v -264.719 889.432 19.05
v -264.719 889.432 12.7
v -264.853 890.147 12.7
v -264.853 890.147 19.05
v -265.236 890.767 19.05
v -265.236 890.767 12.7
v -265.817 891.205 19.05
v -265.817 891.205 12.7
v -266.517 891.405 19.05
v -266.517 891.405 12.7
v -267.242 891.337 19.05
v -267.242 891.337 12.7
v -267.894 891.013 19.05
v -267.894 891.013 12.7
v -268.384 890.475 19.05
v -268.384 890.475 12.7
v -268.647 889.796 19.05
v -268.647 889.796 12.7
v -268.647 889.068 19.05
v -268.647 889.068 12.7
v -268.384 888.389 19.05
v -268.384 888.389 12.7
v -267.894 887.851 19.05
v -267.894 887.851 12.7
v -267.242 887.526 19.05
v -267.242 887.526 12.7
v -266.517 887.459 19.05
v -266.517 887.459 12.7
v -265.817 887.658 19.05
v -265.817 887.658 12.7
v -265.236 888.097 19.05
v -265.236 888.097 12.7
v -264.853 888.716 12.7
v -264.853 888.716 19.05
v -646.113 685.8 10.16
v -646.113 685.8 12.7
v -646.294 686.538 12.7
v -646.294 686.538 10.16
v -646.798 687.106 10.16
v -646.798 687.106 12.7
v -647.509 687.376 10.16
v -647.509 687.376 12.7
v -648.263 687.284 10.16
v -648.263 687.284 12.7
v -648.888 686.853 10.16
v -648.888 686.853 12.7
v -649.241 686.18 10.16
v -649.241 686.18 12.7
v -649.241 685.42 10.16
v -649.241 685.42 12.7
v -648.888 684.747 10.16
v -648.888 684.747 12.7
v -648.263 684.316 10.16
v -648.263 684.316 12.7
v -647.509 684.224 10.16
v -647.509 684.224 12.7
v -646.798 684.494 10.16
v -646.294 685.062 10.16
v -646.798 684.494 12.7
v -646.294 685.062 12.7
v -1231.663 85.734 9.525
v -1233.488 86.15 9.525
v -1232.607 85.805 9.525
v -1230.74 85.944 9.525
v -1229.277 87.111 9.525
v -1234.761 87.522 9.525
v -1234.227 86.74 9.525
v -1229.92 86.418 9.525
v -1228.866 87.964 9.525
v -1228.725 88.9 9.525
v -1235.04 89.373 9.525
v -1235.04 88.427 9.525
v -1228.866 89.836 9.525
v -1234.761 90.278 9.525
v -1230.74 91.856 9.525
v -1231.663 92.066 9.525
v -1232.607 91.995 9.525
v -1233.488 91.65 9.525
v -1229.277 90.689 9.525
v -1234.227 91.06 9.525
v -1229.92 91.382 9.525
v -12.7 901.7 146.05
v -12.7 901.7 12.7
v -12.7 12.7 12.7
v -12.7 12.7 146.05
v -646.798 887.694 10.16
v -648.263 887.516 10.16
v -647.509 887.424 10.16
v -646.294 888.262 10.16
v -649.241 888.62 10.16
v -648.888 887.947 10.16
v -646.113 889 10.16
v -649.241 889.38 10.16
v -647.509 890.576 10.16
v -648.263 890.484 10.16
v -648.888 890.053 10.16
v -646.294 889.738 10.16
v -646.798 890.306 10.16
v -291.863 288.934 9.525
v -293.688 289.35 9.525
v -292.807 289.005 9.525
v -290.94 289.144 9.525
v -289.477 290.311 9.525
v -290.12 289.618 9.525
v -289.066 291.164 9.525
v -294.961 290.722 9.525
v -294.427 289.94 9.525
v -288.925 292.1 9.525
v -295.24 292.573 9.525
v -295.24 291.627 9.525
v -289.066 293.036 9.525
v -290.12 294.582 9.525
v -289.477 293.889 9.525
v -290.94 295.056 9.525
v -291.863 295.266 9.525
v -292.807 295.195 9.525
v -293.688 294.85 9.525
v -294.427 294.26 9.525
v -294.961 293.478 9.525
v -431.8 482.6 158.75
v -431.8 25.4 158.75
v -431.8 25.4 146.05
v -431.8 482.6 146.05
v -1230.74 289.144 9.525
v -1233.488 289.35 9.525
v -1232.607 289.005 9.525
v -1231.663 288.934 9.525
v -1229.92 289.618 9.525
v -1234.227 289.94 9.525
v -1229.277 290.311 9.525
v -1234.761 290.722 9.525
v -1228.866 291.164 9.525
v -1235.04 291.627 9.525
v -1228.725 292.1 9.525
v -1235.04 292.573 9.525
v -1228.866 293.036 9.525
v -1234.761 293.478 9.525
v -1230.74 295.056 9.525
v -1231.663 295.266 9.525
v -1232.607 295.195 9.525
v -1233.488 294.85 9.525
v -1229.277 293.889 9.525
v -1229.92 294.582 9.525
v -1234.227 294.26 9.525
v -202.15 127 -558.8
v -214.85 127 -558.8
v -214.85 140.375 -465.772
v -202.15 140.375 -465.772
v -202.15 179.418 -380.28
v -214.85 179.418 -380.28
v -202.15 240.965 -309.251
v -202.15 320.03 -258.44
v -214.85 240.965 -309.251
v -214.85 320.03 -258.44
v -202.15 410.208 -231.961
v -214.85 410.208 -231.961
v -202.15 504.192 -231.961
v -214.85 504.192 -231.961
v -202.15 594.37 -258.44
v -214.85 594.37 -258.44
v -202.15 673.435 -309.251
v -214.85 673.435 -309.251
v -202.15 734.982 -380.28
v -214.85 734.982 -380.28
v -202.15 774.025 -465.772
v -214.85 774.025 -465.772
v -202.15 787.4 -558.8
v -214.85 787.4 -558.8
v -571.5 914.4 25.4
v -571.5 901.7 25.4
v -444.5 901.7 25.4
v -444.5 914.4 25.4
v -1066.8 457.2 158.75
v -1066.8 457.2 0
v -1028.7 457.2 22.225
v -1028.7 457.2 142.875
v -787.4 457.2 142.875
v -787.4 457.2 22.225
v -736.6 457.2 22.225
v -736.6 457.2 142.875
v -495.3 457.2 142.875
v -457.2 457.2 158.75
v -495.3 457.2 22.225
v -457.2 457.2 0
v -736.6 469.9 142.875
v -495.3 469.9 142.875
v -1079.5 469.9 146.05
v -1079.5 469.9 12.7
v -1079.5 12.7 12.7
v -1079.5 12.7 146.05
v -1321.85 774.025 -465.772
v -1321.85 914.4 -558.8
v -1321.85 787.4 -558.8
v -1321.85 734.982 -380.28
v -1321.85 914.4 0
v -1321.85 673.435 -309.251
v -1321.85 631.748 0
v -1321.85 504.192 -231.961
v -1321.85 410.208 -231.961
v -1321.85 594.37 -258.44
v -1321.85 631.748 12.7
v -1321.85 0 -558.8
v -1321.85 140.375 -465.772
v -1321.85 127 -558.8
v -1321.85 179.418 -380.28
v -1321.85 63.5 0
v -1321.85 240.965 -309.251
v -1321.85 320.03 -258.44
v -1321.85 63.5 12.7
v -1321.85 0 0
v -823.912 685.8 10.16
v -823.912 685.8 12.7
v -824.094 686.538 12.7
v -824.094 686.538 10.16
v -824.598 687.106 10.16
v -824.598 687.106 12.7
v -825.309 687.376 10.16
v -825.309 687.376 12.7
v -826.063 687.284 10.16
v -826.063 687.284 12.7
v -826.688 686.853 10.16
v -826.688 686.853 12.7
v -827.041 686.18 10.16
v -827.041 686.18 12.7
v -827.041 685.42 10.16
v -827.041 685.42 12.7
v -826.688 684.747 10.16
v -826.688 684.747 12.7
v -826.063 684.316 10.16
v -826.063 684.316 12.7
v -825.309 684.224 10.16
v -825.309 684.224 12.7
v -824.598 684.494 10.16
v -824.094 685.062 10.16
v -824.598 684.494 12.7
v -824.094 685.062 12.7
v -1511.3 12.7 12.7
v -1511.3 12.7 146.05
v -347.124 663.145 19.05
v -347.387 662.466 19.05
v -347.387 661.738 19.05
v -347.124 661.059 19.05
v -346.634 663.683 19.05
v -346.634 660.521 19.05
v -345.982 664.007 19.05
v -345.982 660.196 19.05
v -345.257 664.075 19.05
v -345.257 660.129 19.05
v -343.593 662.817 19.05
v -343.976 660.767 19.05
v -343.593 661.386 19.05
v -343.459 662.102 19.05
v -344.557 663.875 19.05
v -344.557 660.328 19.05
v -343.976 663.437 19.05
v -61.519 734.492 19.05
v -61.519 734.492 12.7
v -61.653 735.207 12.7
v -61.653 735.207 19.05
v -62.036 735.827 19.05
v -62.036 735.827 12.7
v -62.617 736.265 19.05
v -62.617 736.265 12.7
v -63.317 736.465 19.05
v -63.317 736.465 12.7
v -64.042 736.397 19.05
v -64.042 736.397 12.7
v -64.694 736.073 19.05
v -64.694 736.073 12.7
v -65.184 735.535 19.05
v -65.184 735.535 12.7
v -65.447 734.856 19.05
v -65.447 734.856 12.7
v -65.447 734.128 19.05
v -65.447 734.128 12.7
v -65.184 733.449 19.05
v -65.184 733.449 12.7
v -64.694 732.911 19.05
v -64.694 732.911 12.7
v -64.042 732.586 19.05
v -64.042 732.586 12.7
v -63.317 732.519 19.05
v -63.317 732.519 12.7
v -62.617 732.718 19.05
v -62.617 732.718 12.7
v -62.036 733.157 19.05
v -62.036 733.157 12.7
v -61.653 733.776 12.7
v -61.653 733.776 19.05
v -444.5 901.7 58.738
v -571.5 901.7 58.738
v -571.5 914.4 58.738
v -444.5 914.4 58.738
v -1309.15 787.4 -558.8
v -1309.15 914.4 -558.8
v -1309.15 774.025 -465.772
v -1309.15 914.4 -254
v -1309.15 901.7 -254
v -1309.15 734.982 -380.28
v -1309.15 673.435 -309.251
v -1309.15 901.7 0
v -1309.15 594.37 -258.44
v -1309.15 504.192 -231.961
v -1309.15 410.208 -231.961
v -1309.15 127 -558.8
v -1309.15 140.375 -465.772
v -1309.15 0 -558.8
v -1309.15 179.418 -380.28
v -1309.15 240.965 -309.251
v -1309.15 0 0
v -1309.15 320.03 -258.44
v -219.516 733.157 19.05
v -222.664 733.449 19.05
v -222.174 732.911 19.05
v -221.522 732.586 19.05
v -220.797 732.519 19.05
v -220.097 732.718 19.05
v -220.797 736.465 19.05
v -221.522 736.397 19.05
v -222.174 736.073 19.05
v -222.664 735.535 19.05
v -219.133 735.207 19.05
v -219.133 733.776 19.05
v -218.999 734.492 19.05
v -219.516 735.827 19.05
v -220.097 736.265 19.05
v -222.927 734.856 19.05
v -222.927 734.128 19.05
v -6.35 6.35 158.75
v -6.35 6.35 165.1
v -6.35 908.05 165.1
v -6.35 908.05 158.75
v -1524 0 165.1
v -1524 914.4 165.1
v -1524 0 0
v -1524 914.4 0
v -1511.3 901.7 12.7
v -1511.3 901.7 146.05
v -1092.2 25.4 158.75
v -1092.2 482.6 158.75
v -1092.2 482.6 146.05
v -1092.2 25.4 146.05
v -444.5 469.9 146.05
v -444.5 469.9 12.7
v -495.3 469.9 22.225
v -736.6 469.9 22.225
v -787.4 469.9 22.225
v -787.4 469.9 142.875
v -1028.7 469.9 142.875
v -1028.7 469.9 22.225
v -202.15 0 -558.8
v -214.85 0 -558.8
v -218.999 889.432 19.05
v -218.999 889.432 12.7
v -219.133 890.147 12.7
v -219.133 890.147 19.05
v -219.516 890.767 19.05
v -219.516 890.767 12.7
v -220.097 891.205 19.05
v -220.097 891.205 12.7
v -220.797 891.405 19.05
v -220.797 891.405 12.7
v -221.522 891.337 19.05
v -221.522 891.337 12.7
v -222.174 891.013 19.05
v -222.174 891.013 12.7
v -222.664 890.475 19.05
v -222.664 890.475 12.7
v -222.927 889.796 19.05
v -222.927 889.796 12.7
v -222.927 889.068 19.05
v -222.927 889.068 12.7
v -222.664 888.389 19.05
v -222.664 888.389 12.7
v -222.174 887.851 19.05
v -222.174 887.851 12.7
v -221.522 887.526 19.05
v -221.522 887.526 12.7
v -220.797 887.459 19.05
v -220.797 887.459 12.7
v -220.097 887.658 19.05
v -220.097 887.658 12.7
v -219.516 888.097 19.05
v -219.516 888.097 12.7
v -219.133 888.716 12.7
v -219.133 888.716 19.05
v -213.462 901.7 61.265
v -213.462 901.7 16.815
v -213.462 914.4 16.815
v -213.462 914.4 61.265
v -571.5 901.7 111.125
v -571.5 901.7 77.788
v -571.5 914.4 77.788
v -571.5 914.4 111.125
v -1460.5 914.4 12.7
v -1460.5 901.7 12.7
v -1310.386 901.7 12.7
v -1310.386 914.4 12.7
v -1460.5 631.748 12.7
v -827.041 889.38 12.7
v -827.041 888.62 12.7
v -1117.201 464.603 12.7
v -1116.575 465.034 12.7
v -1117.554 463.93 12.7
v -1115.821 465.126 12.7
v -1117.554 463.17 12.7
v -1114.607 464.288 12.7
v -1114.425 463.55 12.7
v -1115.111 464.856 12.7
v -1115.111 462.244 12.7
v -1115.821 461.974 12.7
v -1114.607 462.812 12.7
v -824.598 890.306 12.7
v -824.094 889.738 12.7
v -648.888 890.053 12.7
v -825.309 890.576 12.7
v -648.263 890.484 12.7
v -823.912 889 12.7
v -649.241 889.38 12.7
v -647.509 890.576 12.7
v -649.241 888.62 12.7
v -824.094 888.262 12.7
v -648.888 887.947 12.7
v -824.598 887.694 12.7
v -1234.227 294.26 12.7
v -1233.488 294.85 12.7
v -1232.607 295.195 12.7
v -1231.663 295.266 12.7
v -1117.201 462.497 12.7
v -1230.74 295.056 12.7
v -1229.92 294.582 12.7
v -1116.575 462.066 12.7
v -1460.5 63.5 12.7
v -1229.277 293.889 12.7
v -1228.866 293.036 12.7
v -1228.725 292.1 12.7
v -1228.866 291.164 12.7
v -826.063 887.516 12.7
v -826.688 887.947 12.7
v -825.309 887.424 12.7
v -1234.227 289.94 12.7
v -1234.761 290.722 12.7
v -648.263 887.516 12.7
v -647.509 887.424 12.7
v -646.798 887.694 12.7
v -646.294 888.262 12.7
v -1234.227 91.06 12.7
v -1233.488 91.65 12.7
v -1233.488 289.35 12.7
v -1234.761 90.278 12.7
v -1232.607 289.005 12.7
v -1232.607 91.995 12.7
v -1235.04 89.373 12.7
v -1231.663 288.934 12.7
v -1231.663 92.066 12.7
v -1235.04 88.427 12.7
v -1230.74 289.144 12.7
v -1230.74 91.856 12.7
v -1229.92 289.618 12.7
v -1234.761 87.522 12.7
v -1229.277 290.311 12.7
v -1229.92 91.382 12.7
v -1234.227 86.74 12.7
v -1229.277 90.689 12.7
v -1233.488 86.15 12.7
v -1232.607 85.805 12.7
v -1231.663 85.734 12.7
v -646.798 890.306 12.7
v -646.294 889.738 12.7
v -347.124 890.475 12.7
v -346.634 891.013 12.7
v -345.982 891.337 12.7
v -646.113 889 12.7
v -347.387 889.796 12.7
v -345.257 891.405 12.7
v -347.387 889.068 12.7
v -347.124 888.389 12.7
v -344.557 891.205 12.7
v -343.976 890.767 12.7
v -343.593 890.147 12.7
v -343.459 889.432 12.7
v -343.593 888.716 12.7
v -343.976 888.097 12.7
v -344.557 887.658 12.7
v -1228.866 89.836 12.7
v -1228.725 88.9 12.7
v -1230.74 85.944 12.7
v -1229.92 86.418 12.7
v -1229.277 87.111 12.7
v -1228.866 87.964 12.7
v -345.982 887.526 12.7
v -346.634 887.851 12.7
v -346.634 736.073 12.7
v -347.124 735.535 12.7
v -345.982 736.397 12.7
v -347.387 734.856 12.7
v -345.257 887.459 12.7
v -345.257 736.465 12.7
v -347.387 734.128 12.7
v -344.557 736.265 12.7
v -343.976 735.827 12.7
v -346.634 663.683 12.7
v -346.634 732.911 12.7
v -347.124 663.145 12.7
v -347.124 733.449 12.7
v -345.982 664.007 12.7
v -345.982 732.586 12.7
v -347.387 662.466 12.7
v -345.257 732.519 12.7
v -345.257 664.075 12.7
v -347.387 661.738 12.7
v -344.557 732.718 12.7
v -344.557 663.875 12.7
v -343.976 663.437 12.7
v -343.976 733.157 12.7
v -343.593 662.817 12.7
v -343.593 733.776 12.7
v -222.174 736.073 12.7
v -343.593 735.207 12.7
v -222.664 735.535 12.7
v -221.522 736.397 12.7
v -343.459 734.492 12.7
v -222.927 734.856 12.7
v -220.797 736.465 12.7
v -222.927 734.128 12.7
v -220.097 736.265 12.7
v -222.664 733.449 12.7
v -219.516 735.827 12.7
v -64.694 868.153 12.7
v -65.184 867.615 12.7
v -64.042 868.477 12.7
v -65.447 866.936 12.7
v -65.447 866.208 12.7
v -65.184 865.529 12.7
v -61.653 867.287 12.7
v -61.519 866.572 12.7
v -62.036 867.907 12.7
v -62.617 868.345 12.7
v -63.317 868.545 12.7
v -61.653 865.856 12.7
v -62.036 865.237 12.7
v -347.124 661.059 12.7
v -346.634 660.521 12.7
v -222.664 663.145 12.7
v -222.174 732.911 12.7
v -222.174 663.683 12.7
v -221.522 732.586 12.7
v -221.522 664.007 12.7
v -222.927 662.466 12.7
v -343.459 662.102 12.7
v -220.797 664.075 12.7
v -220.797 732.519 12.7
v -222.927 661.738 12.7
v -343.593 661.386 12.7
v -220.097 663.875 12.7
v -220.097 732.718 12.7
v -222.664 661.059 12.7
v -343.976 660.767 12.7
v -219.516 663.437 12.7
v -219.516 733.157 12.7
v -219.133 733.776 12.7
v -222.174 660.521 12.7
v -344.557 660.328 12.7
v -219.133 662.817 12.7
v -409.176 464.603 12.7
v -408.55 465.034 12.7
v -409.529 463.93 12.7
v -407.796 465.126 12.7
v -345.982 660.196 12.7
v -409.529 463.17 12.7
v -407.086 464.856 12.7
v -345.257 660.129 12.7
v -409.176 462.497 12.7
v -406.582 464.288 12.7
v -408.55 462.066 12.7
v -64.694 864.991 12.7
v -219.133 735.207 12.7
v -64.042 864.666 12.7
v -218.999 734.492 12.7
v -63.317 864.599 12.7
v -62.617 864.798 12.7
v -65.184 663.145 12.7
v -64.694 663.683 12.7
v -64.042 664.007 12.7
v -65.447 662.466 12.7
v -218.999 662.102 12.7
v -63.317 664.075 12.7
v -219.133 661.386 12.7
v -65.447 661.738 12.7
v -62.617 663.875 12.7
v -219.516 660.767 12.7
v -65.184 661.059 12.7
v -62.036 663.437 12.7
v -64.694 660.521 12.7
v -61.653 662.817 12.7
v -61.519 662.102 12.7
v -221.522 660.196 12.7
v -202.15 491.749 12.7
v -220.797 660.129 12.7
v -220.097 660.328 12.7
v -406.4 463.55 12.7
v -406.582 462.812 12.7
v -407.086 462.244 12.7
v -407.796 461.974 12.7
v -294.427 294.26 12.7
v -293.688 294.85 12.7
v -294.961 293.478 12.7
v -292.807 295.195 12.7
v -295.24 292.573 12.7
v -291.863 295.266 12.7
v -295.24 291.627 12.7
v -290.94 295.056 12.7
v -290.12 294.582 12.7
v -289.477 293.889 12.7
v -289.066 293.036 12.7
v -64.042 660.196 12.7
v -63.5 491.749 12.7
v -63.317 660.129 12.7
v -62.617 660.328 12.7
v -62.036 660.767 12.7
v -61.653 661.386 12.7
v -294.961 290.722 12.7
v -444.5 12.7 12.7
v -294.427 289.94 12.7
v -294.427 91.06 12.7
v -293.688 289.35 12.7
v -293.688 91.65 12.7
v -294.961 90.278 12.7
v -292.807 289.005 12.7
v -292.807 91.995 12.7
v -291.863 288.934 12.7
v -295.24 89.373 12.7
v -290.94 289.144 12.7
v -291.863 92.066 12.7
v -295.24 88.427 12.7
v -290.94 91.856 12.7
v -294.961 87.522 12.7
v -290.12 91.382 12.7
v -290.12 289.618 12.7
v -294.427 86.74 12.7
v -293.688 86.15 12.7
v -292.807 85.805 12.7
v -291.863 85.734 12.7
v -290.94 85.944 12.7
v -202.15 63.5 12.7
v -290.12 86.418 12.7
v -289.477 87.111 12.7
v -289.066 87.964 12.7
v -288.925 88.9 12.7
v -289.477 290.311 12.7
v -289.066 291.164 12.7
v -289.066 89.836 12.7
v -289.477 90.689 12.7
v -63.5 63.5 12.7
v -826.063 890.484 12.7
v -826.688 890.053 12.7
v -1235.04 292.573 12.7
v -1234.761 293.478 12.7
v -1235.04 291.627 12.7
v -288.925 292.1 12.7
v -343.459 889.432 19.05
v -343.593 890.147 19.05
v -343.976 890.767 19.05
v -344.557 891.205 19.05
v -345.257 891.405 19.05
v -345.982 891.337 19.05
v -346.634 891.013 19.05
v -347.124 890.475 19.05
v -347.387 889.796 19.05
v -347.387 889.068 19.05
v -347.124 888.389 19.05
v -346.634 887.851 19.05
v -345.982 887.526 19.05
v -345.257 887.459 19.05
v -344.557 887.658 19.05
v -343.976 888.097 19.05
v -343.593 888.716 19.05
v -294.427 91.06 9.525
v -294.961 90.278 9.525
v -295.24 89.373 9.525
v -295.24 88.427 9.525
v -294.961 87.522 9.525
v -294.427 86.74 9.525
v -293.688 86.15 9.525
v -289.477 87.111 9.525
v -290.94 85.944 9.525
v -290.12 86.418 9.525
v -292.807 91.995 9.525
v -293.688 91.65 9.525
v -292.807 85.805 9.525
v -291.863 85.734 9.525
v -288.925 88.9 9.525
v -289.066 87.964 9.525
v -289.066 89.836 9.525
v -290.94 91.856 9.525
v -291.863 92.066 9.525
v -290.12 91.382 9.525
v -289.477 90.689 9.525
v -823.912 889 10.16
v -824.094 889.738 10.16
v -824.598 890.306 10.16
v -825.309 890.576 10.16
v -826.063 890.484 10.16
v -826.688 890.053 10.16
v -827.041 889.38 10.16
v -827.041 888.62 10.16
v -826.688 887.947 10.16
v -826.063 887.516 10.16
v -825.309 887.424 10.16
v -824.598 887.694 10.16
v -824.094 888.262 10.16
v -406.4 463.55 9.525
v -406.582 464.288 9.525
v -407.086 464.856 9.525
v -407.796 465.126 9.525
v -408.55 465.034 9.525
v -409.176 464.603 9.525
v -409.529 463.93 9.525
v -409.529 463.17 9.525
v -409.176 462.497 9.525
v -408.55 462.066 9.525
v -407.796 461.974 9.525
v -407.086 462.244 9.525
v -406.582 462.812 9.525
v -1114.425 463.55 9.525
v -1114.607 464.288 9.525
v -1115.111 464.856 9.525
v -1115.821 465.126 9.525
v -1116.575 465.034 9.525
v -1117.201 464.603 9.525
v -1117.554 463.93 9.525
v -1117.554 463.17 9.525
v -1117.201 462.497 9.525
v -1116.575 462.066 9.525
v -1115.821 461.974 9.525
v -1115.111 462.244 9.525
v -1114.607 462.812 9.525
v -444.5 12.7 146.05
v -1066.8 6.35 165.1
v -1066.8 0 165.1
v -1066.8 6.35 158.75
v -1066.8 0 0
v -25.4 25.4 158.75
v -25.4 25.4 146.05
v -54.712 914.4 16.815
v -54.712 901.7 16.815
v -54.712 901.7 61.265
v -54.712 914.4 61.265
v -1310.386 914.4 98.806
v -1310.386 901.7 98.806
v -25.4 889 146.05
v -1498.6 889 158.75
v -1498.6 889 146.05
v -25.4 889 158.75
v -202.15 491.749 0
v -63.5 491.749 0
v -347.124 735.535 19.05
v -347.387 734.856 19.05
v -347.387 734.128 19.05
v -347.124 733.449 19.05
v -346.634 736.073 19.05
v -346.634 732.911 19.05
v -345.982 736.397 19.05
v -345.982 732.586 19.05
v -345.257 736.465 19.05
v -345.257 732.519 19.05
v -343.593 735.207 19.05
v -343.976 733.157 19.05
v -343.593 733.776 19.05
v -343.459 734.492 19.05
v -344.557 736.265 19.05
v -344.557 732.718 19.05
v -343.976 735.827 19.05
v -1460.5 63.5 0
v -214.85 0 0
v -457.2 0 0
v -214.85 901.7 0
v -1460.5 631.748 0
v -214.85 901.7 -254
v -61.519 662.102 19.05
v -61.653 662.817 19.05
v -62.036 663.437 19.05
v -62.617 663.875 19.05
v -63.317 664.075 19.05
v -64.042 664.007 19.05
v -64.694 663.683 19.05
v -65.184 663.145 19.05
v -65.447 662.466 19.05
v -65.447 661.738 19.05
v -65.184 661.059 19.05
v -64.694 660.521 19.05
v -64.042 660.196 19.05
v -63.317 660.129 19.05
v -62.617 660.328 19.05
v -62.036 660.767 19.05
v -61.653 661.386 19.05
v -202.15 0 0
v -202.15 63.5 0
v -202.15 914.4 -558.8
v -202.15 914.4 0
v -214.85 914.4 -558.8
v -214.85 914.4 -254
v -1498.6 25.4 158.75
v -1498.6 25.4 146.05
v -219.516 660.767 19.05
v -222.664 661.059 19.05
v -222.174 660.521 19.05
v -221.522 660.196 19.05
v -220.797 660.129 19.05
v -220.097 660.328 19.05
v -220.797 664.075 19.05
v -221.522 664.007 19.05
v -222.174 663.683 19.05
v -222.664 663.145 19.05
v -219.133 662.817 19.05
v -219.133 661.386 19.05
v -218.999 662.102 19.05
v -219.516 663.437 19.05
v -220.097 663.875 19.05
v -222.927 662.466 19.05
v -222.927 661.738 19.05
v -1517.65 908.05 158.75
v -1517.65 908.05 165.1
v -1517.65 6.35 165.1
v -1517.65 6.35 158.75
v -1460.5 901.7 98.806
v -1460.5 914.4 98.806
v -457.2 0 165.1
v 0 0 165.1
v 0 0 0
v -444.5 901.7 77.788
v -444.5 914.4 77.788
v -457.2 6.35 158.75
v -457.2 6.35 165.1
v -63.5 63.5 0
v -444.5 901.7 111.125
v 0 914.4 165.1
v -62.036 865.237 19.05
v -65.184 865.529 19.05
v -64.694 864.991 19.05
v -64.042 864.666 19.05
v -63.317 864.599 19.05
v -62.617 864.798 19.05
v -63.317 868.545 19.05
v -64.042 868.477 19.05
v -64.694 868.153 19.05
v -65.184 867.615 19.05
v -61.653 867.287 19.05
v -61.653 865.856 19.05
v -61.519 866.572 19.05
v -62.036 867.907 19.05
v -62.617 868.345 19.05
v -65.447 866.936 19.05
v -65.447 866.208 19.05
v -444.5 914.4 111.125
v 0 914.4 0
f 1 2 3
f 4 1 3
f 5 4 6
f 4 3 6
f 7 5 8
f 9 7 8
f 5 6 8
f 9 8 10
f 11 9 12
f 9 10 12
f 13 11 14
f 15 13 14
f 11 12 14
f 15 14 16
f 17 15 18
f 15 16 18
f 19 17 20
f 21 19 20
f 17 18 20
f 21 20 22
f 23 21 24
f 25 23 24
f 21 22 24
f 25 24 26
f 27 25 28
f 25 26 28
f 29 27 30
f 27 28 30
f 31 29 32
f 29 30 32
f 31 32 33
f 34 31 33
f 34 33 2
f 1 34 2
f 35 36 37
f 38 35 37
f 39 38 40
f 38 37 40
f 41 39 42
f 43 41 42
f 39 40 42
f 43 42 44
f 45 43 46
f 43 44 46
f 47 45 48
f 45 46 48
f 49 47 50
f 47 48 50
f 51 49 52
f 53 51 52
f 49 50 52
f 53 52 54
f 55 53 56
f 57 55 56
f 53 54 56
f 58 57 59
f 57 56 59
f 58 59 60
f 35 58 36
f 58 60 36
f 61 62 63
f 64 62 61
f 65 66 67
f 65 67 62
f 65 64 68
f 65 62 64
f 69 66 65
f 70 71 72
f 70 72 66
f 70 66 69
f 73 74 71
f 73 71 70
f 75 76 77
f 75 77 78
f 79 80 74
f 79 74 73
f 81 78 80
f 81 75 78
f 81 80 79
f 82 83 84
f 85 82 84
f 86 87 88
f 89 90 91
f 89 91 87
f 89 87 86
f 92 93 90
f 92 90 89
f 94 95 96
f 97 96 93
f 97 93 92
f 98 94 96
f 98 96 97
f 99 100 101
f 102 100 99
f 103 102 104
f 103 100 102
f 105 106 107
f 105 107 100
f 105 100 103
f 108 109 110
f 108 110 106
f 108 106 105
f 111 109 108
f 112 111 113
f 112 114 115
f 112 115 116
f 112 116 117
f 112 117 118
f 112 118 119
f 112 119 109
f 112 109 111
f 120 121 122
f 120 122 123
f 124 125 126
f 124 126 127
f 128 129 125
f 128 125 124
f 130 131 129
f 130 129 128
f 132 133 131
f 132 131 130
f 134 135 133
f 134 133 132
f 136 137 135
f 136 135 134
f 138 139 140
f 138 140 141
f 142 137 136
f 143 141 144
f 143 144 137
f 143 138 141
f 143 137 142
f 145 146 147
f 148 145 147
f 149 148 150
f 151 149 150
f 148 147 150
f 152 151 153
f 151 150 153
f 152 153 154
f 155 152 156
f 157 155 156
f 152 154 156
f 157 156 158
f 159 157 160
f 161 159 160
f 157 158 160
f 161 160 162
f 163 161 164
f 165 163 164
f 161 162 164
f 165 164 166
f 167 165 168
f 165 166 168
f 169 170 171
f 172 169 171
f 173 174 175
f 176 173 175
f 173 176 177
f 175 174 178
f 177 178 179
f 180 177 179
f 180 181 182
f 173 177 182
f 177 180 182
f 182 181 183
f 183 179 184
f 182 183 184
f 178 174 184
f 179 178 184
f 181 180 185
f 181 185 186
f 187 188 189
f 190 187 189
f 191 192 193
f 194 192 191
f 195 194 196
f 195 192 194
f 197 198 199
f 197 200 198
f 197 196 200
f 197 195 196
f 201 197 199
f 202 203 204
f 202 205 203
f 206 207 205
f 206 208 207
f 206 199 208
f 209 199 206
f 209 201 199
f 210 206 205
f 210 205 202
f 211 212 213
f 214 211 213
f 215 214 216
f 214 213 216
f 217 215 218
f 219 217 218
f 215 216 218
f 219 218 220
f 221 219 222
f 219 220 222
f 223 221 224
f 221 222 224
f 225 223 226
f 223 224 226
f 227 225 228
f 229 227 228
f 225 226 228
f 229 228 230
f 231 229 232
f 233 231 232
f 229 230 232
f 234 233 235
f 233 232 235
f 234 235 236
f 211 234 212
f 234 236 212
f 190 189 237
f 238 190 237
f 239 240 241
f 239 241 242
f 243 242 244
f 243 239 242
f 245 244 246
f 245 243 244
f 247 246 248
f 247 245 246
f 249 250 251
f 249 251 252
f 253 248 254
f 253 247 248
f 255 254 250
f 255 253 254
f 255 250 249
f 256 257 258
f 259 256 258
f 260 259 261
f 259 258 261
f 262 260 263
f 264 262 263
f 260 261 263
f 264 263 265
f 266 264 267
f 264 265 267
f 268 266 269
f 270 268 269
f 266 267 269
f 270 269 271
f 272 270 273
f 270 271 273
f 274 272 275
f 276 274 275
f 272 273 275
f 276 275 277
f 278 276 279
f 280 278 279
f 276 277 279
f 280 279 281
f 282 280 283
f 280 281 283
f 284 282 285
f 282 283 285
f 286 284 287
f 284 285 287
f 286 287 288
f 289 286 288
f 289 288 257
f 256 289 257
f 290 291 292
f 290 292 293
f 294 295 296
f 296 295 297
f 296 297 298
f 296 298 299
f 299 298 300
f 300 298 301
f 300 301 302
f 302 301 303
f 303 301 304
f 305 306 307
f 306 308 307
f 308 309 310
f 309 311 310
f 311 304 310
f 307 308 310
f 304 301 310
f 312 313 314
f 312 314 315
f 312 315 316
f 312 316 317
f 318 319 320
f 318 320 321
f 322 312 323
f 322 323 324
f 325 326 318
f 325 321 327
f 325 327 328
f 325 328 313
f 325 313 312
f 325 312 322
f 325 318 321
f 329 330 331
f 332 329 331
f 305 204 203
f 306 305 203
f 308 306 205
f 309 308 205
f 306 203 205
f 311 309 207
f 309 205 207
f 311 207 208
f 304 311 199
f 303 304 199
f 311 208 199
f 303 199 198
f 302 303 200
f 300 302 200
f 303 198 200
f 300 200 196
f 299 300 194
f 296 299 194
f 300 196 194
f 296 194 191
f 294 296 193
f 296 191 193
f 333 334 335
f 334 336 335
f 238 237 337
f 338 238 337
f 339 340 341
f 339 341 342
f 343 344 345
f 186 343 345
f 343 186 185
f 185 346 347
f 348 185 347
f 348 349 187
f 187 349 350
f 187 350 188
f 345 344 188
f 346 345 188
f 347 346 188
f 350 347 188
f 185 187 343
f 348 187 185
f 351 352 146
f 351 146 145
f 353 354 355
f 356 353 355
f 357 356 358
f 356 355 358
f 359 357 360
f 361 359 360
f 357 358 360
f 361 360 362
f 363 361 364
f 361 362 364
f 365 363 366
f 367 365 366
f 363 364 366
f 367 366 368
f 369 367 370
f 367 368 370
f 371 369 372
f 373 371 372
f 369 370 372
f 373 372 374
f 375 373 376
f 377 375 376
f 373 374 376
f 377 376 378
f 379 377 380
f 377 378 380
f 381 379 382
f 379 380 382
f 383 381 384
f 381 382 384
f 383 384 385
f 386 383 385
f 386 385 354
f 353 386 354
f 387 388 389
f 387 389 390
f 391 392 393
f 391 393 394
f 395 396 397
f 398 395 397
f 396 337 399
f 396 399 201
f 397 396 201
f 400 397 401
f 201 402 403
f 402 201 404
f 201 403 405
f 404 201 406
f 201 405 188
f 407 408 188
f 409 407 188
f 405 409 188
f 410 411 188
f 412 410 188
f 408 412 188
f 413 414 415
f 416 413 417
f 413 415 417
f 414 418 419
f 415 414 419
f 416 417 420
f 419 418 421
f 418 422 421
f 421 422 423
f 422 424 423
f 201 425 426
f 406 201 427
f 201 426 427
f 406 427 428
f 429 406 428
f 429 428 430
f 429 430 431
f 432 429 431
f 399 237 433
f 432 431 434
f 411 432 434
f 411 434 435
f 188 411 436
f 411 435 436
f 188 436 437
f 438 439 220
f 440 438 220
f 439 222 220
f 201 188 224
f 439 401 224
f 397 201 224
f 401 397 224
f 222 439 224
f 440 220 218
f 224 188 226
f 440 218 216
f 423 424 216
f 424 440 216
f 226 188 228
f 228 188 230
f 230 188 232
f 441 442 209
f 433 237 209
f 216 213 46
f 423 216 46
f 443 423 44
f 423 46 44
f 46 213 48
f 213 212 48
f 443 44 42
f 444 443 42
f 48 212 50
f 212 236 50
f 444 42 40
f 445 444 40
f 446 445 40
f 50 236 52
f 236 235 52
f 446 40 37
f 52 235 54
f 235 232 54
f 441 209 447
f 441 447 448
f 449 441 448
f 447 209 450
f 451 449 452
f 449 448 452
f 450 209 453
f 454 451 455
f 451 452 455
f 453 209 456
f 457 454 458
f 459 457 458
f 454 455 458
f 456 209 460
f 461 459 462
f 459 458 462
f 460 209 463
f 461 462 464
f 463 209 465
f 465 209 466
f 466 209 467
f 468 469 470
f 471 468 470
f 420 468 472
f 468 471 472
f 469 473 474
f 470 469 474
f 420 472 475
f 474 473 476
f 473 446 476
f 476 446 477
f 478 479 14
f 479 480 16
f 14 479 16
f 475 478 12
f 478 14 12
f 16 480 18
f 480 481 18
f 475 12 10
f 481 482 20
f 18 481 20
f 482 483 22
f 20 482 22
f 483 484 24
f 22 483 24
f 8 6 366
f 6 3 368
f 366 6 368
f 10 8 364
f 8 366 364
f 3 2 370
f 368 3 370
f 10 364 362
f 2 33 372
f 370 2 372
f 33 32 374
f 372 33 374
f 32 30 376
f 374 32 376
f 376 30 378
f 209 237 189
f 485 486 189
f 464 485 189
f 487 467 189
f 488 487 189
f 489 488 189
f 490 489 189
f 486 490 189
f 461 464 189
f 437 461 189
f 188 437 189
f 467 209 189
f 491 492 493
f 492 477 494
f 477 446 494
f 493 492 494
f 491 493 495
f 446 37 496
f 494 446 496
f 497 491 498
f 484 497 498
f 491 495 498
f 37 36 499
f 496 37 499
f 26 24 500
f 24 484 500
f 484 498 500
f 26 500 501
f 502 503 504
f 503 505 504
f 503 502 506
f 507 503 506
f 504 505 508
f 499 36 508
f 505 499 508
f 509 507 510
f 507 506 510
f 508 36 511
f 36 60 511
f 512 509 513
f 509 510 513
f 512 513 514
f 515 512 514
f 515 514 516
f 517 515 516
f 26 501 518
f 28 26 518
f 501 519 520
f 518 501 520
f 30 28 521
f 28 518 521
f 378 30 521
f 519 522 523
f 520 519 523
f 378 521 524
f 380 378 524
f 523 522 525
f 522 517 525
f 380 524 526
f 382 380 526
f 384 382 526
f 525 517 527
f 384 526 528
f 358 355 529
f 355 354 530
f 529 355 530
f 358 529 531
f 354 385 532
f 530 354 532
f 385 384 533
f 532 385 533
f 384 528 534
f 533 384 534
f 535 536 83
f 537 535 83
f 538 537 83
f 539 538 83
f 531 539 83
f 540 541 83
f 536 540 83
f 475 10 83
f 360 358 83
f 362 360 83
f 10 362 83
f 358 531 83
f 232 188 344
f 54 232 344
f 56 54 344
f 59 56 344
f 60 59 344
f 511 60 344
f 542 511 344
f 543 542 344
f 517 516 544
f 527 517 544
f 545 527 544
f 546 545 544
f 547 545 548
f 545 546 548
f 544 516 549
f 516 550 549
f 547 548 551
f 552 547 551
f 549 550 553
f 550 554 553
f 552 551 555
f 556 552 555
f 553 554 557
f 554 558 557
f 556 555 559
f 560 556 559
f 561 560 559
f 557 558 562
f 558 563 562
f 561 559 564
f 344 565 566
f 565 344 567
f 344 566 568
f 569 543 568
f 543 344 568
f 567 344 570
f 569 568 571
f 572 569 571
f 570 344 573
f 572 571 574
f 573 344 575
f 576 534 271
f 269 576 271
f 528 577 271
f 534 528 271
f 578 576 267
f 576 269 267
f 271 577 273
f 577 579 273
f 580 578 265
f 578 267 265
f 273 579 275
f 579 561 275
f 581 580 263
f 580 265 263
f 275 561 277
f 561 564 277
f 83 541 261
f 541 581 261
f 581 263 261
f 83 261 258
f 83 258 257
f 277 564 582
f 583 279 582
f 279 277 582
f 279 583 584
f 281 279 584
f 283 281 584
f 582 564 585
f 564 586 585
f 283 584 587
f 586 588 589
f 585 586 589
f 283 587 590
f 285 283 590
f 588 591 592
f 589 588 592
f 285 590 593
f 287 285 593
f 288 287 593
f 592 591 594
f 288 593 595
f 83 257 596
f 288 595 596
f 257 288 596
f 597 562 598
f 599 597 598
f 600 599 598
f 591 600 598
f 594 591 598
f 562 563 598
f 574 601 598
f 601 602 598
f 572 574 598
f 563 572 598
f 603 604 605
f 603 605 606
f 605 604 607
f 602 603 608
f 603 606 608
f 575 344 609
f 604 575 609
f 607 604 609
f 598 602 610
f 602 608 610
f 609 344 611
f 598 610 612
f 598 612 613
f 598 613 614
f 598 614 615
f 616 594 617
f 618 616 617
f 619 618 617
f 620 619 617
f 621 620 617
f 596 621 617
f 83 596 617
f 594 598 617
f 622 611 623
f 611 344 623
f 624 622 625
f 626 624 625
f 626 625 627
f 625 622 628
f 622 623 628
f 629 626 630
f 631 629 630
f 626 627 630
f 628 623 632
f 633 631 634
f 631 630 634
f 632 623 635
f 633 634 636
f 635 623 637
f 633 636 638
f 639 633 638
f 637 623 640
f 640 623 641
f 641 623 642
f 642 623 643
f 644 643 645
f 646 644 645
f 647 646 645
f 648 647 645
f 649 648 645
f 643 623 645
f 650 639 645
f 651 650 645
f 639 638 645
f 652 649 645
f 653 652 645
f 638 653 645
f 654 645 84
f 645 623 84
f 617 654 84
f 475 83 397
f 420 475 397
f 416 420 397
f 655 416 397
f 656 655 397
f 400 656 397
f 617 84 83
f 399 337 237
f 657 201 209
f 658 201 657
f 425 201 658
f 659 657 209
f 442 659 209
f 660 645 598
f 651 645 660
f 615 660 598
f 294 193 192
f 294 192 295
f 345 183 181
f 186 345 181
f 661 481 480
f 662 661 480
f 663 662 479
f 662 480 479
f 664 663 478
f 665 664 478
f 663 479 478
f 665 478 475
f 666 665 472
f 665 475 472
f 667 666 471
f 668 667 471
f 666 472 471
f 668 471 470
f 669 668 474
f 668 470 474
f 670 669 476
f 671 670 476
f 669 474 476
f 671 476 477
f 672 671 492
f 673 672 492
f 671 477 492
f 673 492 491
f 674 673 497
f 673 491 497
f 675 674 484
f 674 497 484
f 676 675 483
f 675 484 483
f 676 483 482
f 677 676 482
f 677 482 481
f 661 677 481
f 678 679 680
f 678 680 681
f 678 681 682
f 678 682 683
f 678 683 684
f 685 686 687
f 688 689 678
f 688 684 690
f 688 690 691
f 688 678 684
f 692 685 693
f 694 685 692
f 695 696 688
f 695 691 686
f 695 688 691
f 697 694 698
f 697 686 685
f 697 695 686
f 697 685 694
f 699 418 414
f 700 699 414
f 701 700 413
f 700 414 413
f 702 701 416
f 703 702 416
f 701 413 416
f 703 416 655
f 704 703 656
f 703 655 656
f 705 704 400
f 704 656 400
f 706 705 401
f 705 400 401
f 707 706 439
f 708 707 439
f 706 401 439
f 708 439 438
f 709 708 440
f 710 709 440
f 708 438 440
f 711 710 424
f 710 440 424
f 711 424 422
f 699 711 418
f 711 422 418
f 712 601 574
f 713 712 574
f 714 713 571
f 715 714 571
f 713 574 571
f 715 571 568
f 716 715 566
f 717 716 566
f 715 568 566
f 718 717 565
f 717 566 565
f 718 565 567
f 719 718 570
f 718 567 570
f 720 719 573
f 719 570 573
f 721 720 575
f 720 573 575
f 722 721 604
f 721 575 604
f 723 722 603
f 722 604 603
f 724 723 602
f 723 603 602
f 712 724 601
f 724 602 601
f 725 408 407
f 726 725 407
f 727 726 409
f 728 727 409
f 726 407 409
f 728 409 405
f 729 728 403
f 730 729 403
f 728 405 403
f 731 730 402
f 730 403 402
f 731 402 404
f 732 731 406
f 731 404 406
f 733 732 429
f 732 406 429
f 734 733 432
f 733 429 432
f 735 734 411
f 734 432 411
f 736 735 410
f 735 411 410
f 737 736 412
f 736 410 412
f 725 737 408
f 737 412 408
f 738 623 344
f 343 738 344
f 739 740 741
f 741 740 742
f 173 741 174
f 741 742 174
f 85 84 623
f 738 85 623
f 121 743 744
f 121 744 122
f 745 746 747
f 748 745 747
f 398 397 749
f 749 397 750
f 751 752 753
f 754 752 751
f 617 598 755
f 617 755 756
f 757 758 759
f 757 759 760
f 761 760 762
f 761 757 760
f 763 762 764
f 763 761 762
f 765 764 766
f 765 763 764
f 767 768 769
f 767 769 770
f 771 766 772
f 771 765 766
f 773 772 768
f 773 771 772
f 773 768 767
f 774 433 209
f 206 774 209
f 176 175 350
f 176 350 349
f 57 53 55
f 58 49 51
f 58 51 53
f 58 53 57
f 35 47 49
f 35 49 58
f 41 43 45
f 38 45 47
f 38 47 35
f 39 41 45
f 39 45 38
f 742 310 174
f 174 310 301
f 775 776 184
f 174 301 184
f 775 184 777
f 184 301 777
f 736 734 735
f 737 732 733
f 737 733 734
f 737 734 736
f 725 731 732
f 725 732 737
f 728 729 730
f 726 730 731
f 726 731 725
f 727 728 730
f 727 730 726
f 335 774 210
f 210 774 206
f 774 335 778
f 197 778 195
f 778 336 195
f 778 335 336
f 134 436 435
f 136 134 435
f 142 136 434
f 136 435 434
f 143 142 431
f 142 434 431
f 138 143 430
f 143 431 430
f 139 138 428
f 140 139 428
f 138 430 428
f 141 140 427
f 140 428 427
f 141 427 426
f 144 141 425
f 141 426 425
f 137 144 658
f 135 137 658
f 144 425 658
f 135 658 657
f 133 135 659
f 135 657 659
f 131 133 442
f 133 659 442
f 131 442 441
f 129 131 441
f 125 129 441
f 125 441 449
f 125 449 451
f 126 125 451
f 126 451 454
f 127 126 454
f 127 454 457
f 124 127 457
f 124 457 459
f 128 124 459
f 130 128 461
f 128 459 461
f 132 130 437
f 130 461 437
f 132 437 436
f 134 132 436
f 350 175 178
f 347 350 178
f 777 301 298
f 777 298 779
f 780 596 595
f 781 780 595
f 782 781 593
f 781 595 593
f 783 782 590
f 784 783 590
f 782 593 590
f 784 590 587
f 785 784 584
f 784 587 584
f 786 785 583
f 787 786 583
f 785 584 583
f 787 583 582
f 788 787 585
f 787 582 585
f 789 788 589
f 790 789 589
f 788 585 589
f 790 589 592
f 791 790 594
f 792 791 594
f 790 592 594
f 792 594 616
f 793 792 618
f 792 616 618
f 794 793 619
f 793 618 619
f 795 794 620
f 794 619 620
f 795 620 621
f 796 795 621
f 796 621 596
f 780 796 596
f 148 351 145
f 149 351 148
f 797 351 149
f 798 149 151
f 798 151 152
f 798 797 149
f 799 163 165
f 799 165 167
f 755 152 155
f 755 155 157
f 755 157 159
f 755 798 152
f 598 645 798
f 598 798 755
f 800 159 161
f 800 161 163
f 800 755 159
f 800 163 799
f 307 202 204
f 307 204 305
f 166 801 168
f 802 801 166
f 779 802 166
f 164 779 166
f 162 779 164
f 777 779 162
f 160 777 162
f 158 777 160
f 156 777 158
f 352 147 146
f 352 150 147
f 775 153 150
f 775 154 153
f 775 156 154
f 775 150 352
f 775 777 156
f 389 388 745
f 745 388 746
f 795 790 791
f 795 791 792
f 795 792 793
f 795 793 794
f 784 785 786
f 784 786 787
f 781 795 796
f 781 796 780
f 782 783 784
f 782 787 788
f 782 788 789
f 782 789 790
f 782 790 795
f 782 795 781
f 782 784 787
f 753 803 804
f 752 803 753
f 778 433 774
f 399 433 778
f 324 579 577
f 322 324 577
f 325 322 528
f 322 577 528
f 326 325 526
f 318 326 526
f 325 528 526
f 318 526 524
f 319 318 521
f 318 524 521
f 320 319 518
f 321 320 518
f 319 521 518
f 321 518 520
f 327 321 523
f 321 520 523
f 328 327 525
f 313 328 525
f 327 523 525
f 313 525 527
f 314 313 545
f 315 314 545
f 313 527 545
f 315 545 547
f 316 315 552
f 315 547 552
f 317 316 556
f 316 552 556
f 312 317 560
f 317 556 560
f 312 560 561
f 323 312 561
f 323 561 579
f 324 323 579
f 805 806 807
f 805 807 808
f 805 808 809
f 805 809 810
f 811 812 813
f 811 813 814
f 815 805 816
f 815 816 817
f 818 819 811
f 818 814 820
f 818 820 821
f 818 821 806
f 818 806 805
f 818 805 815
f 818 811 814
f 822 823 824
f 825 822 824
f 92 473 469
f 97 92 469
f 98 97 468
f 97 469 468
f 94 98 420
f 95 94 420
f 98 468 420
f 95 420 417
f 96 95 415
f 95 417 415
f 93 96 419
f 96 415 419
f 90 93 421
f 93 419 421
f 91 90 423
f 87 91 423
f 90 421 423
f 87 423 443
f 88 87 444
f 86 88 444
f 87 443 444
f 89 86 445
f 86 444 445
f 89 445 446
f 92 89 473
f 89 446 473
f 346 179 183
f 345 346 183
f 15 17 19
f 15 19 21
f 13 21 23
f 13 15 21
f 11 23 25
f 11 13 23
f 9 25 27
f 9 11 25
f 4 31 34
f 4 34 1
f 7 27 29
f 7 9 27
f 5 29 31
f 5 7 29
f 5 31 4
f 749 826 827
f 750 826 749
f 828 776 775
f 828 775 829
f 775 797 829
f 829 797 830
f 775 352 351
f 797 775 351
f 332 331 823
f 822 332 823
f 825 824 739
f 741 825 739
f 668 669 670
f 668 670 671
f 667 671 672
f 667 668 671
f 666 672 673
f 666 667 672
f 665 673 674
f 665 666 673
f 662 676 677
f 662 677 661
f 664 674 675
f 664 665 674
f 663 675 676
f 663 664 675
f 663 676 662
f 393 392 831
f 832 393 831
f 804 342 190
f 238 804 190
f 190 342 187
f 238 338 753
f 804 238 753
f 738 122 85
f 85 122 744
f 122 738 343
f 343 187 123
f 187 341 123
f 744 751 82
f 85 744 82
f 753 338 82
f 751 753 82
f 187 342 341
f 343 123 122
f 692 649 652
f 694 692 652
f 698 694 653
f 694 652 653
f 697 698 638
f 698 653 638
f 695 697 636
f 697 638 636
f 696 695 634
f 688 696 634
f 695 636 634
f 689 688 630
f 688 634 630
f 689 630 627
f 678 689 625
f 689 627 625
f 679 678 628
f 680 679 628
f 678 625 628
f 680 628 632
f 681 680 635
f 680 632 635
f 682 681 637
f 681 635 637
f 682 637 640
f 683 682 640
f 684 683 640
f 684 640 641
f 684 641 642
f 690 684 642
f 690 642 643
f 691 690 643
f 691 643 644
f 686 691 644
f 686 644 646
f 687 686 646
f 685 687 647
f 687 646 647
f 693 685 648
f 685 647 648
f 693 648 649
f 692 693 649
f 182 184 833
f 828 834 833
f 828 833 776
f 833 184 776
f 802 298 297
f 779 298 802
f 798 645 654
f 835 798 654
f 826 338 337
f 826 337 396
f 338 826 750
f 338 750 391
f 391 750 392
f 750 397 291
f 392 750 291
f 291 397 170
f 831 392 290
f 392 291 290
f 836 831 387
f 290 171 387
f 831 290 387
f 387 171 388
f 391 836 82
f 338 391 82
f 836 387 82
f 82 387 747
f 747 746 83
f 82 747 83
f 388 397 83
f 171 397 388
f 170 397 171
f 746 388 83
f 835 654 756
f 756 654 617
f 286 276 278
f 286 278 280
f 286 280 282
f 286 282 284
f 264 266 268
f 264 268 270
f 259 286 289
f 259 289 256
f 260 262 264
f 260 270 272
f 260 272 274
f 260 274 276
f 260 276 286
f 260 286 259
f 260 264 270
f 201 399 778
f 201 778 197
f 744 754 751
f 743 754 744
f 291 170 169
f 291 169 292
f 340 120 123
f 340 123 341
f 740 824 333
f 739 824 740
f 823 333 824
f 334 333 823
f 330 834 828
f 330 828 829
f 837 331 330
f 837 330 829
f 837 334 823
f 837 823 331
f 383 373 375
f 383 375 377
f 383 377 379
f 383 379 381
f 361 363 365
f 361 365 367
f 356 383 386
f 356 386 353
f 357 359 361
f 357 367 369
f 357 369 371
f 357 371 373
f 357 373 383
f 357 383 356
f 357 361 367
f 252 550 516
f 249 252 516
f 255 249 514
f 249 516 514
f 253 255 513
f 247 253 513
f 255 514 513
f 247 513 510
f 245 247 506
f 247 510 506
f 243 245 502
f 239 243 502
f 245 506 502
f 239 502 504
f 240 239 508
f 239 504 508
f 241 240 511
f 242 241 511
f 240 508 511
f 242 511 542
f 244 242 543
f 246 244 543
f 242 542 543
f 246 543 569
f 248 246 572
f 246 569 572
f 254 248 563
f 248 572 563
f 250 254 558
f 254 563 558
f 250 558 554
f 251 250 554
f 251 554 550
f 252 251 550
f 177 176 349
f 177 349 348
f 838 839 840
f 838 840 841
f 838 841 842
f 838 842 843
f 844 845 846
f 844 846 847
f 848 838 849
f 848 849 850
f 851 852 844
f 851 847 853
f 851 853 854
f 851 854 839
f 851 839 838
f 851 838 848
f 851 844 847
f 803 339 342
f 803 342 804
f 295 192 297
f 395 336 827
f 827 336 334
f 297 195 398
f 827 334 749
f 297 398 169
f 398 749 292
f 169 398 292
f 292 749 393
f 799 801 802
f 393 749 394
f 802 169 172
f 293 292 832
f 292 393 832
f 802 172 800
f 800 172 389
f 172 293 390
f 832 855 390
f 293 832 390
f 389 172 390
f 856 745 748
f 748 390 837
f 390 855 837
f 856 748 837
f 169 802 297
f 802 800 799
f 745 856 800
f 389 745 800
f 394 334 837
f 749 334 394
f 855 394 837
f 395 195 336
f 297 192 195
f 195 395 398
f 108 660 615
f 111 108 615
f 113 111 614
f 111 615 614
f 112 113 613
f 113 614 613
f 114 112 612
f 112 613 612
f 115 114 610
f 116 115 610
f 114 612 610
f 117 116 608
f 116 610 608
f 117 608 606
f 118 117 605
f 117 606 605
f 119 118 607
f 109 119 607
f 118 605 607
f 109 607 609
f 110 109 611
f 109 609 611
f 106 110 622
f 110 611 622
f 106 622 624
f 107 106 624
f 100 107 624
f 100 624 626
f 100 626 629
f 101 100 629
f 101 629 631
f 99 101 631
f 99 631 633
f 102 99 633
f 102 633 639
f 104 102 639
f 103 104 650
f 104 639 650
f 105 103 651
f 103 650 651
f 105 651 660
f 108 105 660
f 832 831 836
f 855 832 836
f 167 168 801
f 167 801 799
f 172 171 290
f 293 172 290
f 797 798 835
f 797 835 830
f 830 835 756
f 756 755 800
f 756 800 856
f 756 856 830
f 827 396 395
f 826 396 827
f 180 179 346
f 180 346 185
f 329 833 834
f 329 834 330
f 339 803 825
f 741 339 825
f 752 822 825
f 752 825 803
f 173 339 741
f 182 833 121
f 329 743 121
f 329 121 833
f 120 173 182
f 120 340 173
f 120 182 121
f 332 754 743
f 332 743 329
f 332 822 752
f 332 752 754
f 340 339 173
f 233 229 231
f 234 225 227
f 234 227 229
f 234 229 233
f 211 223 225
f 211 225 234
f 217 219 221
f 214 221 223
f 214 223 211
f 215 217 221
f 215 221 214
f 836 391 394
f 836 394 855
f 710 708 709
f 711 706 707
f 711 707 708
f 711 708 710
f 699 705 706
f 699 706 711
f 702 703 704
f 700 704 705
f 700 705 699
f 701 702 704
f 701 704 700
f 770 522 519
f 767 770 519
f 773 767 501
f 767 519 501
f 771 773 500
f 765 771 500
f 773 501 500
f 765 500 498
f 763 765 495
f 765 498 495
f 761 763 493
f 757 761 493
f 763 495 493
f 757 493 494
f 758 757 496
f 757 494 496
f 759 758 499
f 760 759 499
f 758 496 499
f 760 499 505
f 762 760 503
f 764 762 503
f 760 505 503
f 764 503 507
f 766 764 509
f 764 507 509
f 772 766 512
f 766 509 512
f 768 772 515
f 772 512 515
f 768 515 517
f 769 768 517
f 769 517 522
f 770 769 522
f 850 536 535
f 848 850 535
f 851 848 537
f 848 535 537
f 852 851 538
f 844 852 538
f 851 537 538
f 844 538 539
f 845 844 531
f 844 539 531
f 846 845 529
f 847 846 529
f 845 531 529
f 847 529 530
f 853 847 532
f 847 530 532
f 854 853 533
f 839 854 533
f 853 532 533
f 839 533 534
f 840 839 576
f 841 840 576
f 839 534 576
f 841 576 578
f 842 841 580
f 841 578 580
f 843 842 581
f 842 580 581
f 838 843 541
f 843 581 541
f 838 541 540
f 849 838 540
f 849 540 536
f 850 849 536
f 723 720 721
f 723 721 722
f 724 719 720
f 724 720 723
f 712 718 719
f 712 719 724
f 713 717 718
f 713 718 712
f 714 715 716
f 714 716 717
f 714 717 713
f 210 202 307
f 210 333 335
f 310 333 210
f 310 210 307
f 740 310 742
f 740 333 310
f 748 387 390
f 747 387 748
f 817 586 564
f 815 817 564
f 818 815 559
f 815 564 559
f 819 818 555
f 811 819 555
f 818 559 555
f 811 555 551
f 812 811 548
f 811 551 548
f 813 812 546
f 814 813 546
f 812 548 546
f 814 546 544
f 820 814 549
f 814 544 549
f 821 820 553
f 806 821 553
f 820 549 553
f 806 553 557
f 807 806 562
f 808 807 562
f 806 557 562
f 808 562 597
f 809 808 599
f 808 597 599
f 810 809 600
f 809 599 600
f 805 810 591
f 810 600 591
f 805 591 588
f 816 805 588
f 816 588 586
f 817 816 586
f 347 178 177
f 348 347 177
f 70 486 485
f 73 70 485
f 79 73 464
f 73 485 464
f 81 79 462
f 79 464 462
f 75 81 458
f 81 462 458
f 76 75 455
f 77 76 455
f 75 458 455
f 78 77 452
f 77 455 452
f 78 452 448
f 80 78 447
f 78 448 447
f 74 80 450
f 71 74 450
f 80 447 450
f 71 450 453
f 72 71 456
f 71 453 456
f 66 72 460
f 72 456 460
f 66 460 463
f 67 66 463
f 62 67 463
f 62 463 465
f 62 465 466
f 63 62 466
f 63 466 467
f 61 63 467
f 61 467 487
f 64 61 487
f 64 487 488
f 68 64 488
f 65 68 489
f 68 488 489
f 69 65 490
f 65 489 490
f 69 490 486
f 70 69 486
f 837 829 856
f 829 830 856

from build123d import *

# Parameters (mm, degrees)
F1_DEPTH  = 12.7
F3_DEPTH  = 152.4
F4_R      = 1.9812
F5_DEPTH  = 6.35
F6_W      = 158.75
F6_H      = 44.45
F7_DEPTH  = 25.4
F8_W      = 127
F8_H      = 33.3375
F9_DEPTH  = 25.4
F10_R     = 1.5875
F11_DEPTH = 2.54
F12_W     = 138.649558
F12_H     = 568.248292
F12_H_2   = 428.248572
F13_DEPTH = 12.701
F14_R     = 3.175
F15_DEPTH = 3.175
F16_R     = 1.5875
F17_DEPTH = 3.175
F18_W     = 150.114
F18_H     = 86.106
F19_DEPTH = 25.4
F21_DEPTH = 6.35
F23_DEPTH = 12.7
F24_W     = 241.3
F24_H     = 120.65
F25_DEPTH = 25.4
F26_W     = 12.7
F26_H     = 914.4
F27_DEPTH = 558.8
F28_W     = 1094.300884
F28_H     = 12.7
F29_DEPTH = 254
F31_DEPTH = 1321.851442
F32_W     = 622.3
F32_H     = 457.2
F33_DEPTH = 25.4


with BuildPart() as f1:
    # F0 (on Top) → F1 (new body)
    with BuildSketch(Plane.XY):
        Polygon((0, 0), (0, 914.4), (-1524, 914.4), (-1524, 0), (-1066.8, 0), (-1066.8, 457.2), (-457.2, 457.2), (-457.2, 0), align=None)
    extrude(amount=F1_DEPTH)

    # F2 (on face) → F3 (join)
    with BuildSketch(Plane.XY.offset(12.7)):
        Polygon((-457.2, 0), (0, 0), (0, 914.4), (-1524, 914.4), (-1524, 0), (-1066.8, 0), (-1066.8, 457.2), (-457.2, 457.2), align=None)
        Polygon((-12.7, 901.7), (-12.7, 12.7), (-444.5, 12.7), (-444.5, 469.9), (-1079.5, 469.9), (-1079.5, 12.7), (-1511.3, 12.7), (-1511.3, 901.7), align=None, mode=Mode.SUBTRACT)
    extrude(amount=F3_DEPTH)

    # F4 (on face) → F5 (join)
    with BuildSketch(Plane.XY.offset(12.7)):
        with Locations((-345.44, 889.4318)):
            Circle(F4_R)
        with Locations((-266.7, 889.4318)):
            Circle(F4_R)
        with Locations((-220.98, 889.4318)):
            Circle(F4_R)
        with Locations((-63.5, 866.5718)):
            Circle(F4_R)
        with Locations((-63.5, 734.4918)):
            Circle(F4_R)
        with Locations((-220.98, 734.4918)):
            Circle(F4_R)
        with Locations((-345.44, 734.4918)):
            Circle(F4_R)
        with Locations((-345.44, 662.1018)):
            Circle(F4_R)
        with Locations((-220.98, 662.1018)):
            Circle(F4_R)
        with Locations((-63.5, 662.1018)):
            Circle(F4_R)
    extrude(amount=F5_DEPTH)

    # F6 (on face) → F7 (cut)
    with BuildSketch(Plane.XZ.offset(-901.7)):
        with Locations((-134.0866, 39.0398)):
            Rectangle(F6_W, F6_H)
    extrude(amount=-F7_DEPTH, mode=Mode.SUBTRACT)

    # F8 (on face) → F9 (cut)
    with BuildSketch(Plane.XZ.offset(-901.7)):
        with Locations((-508, 42.06875)):
            Rectangle(F8_W, F8_H)
        with Locations((-508, 94.45625)):
            Rectangle(F8_W, F8_H)
    extrude(amount=-F9_DEPTH, mode=Mode.SUBTRACT)

    # F10 (on face) → F11 (cut)
    with BuildSketch(Plane.XY.offset(12.7)):
        with Locations((-647.7, 889)):
            Circle(F10_R)
        with Locations((-647.7, 685.8)):
            Circle(F10_R)
        with Locations((-825.5, 889)):
            Circle(F10_R)
        with Locations((-825.5, 685.8)):
            Circle(F10_R)
    extrude(amount=-F11_DEPTH, mode=Mode.SUBTRACT)

    # F12 (on face) → F13 (cut, through all)
    with BuildSketch(Plane.XY.offset(12.7)):
        with Locations((-1391.175221, 347.624146)):
            Rectangle(F12_W, F12_H)
        with Locations((-132.824779, 277.624286)):
            Rectangle(F12_W, F12_H_2)
    extrude(amount=-F13_DEPTH, mode=Mode.SUBTRACT)

    # F14 (on face) → F15 (cut)
    with BuildSketch(Plane.XY.offset(12.7)):
        with Locations((-1231.9, 88.9)):
            Circle(F14_R)
        with Locations((-1231.9, 292.1)):
            Circle(F14_R)
        with Locations((-292.1, 292.1)):
            Circle(F14_R)
        with Locations((-292.1, 88.9)):
            Circle(F14_R)
    extrude(amount=-F15_DEPTH, mode=Mode.SUBTRACT)

    # F16 (on face) → F17 (cut)
    with BuildSketch(Plane.XY.offset(12.7)):
        with Locations((-1116.0125, 463.55)):
            Circle(F16_R)
        with Locations((-407.9875, 463.55)):
            Circle(F16_R)
    extrude(amount=-F17_DEPTH, mode=Mode.SUBTRACT)

    # F18 (on face) → F19 (cut)
    with BuildSketch(Plane.XZ.offset(-901.7)):
        with Locations((-1385.443, 55.753)):
            Rectangle(F18_W, F18_H)
    extrude(amount=-F19_DEPTH, mode=Mode.SUBTRACT)

    # F20 (on face) → F21 (cut)
    with BuildSketch(Plane.XY.offset(165.1)):
        Polygon((-1517.65, 908.05), (-1517.65, 6.35), (-1073.15, 6.35), (-1073.15, 463.55), (-450.85, 463.55), (-450.85, 6.35), (-6.35, 6.35), (-6.35, 908.05), align=None)
        Polygon((-1079.5, 12.7), (-1511.3, 12.7), (-1511.3, 901.7), (-12.7, 901.7), (-12.7, 12.7), (-444.5, 12.7), (-444.5, 469.9), (-1079.5, 469.9), align=None, mode=Mode.SUBTRACT)
    extrude(amount=-F21_DEPTH, mode=Mode.SUBTRACT)

    # F22 (on face) → F23 (join)
    with BuildSketch(Plane.XY.offset(158.75)):
        Polygon((-1511.3, 901.7), (-1511.3, 12.7), (-1079.5, 12.7), (-1079.5, 469.9), (-444.5, 469.9), (-444.5, 12.7), (-12.7, 12.7), (-12.7, 901.7), align=None)
        Polygon((-1092.2, 25.4), (-1498.6, 25.4), (-1498.6, 889), (-25.4, 889), (-25.4, 25.4), (-431.8, 25.4), (-431.8, 482.6), (-1092.2, 482.6), align=None, mode=Mode.SUBTRACT)
    extrude(amount=-F23_DEPTH)

    # F24 (on face) → F25 (cut)
    with BuildSketch(Plane.XZ.offset(-457.2)):
        with Locations((-908.05, 82.55)):
            Rectangle(F24_W, F24_H)
        with Locations((-615.95, 82.55)):
            Rectangle(F24_W, F24_H)
    extrude(amount=-F25_DEPTH, mode=Mode.SUBTRACT)

    # F26 (on face) → F27 (join)
    with BuildSketch(Plane(origin=(0, 0, 0), x_dir=(1, 0, 0), z_dir=(0, 0, -1))):
        with Locations((-1315.500442, -457.2)):
            Rectangle(F26_W, F26_H)
        with Locations((-208.499558, -457.2)):
            Rectangle(F26_W, F26_H)
    extrude(amount=F27_DEPTH)

    # F28 (on face) → F29 (join)
    with BuildSketch(Plane(origin=(0, 0, 0), x_dir=(1, 0, 0), z_dir=(0, 0, -1))):
        with Locations((-762, -908.05)):
            Rectangle(F28_W, F28_H)
    extrude(amount=F29_DEPTH)

    # F30 (on face) → F31 (cut, through all)
    with BuildSketch(Plane(origin=(-1321.850442, 0, 0), x_dir=(0, -1, 0), z_dir=(-1, 0, 0))):
        with BuildLine():
            Line((-787.4, -558.8), (-127, -558.8))
            ThreePointArc((-127, -558.8), (-457.2, -228.6), (-787.4, -558.8))
        make_face()
    extrude(amount=-F31_DEPTH, mode=Mode.SUBTRACT)

    # F32 (on face) → F33 (cut)
    with BuildSketch(Plane.XY.offset(158.75)):
        with Locations((-762, 234.95)):
            Rectangle(F32_W, F32_H)
    extrude(amount=F33_DEPTH, mode=Mode.SUBTRACT)


solid = f1.part
